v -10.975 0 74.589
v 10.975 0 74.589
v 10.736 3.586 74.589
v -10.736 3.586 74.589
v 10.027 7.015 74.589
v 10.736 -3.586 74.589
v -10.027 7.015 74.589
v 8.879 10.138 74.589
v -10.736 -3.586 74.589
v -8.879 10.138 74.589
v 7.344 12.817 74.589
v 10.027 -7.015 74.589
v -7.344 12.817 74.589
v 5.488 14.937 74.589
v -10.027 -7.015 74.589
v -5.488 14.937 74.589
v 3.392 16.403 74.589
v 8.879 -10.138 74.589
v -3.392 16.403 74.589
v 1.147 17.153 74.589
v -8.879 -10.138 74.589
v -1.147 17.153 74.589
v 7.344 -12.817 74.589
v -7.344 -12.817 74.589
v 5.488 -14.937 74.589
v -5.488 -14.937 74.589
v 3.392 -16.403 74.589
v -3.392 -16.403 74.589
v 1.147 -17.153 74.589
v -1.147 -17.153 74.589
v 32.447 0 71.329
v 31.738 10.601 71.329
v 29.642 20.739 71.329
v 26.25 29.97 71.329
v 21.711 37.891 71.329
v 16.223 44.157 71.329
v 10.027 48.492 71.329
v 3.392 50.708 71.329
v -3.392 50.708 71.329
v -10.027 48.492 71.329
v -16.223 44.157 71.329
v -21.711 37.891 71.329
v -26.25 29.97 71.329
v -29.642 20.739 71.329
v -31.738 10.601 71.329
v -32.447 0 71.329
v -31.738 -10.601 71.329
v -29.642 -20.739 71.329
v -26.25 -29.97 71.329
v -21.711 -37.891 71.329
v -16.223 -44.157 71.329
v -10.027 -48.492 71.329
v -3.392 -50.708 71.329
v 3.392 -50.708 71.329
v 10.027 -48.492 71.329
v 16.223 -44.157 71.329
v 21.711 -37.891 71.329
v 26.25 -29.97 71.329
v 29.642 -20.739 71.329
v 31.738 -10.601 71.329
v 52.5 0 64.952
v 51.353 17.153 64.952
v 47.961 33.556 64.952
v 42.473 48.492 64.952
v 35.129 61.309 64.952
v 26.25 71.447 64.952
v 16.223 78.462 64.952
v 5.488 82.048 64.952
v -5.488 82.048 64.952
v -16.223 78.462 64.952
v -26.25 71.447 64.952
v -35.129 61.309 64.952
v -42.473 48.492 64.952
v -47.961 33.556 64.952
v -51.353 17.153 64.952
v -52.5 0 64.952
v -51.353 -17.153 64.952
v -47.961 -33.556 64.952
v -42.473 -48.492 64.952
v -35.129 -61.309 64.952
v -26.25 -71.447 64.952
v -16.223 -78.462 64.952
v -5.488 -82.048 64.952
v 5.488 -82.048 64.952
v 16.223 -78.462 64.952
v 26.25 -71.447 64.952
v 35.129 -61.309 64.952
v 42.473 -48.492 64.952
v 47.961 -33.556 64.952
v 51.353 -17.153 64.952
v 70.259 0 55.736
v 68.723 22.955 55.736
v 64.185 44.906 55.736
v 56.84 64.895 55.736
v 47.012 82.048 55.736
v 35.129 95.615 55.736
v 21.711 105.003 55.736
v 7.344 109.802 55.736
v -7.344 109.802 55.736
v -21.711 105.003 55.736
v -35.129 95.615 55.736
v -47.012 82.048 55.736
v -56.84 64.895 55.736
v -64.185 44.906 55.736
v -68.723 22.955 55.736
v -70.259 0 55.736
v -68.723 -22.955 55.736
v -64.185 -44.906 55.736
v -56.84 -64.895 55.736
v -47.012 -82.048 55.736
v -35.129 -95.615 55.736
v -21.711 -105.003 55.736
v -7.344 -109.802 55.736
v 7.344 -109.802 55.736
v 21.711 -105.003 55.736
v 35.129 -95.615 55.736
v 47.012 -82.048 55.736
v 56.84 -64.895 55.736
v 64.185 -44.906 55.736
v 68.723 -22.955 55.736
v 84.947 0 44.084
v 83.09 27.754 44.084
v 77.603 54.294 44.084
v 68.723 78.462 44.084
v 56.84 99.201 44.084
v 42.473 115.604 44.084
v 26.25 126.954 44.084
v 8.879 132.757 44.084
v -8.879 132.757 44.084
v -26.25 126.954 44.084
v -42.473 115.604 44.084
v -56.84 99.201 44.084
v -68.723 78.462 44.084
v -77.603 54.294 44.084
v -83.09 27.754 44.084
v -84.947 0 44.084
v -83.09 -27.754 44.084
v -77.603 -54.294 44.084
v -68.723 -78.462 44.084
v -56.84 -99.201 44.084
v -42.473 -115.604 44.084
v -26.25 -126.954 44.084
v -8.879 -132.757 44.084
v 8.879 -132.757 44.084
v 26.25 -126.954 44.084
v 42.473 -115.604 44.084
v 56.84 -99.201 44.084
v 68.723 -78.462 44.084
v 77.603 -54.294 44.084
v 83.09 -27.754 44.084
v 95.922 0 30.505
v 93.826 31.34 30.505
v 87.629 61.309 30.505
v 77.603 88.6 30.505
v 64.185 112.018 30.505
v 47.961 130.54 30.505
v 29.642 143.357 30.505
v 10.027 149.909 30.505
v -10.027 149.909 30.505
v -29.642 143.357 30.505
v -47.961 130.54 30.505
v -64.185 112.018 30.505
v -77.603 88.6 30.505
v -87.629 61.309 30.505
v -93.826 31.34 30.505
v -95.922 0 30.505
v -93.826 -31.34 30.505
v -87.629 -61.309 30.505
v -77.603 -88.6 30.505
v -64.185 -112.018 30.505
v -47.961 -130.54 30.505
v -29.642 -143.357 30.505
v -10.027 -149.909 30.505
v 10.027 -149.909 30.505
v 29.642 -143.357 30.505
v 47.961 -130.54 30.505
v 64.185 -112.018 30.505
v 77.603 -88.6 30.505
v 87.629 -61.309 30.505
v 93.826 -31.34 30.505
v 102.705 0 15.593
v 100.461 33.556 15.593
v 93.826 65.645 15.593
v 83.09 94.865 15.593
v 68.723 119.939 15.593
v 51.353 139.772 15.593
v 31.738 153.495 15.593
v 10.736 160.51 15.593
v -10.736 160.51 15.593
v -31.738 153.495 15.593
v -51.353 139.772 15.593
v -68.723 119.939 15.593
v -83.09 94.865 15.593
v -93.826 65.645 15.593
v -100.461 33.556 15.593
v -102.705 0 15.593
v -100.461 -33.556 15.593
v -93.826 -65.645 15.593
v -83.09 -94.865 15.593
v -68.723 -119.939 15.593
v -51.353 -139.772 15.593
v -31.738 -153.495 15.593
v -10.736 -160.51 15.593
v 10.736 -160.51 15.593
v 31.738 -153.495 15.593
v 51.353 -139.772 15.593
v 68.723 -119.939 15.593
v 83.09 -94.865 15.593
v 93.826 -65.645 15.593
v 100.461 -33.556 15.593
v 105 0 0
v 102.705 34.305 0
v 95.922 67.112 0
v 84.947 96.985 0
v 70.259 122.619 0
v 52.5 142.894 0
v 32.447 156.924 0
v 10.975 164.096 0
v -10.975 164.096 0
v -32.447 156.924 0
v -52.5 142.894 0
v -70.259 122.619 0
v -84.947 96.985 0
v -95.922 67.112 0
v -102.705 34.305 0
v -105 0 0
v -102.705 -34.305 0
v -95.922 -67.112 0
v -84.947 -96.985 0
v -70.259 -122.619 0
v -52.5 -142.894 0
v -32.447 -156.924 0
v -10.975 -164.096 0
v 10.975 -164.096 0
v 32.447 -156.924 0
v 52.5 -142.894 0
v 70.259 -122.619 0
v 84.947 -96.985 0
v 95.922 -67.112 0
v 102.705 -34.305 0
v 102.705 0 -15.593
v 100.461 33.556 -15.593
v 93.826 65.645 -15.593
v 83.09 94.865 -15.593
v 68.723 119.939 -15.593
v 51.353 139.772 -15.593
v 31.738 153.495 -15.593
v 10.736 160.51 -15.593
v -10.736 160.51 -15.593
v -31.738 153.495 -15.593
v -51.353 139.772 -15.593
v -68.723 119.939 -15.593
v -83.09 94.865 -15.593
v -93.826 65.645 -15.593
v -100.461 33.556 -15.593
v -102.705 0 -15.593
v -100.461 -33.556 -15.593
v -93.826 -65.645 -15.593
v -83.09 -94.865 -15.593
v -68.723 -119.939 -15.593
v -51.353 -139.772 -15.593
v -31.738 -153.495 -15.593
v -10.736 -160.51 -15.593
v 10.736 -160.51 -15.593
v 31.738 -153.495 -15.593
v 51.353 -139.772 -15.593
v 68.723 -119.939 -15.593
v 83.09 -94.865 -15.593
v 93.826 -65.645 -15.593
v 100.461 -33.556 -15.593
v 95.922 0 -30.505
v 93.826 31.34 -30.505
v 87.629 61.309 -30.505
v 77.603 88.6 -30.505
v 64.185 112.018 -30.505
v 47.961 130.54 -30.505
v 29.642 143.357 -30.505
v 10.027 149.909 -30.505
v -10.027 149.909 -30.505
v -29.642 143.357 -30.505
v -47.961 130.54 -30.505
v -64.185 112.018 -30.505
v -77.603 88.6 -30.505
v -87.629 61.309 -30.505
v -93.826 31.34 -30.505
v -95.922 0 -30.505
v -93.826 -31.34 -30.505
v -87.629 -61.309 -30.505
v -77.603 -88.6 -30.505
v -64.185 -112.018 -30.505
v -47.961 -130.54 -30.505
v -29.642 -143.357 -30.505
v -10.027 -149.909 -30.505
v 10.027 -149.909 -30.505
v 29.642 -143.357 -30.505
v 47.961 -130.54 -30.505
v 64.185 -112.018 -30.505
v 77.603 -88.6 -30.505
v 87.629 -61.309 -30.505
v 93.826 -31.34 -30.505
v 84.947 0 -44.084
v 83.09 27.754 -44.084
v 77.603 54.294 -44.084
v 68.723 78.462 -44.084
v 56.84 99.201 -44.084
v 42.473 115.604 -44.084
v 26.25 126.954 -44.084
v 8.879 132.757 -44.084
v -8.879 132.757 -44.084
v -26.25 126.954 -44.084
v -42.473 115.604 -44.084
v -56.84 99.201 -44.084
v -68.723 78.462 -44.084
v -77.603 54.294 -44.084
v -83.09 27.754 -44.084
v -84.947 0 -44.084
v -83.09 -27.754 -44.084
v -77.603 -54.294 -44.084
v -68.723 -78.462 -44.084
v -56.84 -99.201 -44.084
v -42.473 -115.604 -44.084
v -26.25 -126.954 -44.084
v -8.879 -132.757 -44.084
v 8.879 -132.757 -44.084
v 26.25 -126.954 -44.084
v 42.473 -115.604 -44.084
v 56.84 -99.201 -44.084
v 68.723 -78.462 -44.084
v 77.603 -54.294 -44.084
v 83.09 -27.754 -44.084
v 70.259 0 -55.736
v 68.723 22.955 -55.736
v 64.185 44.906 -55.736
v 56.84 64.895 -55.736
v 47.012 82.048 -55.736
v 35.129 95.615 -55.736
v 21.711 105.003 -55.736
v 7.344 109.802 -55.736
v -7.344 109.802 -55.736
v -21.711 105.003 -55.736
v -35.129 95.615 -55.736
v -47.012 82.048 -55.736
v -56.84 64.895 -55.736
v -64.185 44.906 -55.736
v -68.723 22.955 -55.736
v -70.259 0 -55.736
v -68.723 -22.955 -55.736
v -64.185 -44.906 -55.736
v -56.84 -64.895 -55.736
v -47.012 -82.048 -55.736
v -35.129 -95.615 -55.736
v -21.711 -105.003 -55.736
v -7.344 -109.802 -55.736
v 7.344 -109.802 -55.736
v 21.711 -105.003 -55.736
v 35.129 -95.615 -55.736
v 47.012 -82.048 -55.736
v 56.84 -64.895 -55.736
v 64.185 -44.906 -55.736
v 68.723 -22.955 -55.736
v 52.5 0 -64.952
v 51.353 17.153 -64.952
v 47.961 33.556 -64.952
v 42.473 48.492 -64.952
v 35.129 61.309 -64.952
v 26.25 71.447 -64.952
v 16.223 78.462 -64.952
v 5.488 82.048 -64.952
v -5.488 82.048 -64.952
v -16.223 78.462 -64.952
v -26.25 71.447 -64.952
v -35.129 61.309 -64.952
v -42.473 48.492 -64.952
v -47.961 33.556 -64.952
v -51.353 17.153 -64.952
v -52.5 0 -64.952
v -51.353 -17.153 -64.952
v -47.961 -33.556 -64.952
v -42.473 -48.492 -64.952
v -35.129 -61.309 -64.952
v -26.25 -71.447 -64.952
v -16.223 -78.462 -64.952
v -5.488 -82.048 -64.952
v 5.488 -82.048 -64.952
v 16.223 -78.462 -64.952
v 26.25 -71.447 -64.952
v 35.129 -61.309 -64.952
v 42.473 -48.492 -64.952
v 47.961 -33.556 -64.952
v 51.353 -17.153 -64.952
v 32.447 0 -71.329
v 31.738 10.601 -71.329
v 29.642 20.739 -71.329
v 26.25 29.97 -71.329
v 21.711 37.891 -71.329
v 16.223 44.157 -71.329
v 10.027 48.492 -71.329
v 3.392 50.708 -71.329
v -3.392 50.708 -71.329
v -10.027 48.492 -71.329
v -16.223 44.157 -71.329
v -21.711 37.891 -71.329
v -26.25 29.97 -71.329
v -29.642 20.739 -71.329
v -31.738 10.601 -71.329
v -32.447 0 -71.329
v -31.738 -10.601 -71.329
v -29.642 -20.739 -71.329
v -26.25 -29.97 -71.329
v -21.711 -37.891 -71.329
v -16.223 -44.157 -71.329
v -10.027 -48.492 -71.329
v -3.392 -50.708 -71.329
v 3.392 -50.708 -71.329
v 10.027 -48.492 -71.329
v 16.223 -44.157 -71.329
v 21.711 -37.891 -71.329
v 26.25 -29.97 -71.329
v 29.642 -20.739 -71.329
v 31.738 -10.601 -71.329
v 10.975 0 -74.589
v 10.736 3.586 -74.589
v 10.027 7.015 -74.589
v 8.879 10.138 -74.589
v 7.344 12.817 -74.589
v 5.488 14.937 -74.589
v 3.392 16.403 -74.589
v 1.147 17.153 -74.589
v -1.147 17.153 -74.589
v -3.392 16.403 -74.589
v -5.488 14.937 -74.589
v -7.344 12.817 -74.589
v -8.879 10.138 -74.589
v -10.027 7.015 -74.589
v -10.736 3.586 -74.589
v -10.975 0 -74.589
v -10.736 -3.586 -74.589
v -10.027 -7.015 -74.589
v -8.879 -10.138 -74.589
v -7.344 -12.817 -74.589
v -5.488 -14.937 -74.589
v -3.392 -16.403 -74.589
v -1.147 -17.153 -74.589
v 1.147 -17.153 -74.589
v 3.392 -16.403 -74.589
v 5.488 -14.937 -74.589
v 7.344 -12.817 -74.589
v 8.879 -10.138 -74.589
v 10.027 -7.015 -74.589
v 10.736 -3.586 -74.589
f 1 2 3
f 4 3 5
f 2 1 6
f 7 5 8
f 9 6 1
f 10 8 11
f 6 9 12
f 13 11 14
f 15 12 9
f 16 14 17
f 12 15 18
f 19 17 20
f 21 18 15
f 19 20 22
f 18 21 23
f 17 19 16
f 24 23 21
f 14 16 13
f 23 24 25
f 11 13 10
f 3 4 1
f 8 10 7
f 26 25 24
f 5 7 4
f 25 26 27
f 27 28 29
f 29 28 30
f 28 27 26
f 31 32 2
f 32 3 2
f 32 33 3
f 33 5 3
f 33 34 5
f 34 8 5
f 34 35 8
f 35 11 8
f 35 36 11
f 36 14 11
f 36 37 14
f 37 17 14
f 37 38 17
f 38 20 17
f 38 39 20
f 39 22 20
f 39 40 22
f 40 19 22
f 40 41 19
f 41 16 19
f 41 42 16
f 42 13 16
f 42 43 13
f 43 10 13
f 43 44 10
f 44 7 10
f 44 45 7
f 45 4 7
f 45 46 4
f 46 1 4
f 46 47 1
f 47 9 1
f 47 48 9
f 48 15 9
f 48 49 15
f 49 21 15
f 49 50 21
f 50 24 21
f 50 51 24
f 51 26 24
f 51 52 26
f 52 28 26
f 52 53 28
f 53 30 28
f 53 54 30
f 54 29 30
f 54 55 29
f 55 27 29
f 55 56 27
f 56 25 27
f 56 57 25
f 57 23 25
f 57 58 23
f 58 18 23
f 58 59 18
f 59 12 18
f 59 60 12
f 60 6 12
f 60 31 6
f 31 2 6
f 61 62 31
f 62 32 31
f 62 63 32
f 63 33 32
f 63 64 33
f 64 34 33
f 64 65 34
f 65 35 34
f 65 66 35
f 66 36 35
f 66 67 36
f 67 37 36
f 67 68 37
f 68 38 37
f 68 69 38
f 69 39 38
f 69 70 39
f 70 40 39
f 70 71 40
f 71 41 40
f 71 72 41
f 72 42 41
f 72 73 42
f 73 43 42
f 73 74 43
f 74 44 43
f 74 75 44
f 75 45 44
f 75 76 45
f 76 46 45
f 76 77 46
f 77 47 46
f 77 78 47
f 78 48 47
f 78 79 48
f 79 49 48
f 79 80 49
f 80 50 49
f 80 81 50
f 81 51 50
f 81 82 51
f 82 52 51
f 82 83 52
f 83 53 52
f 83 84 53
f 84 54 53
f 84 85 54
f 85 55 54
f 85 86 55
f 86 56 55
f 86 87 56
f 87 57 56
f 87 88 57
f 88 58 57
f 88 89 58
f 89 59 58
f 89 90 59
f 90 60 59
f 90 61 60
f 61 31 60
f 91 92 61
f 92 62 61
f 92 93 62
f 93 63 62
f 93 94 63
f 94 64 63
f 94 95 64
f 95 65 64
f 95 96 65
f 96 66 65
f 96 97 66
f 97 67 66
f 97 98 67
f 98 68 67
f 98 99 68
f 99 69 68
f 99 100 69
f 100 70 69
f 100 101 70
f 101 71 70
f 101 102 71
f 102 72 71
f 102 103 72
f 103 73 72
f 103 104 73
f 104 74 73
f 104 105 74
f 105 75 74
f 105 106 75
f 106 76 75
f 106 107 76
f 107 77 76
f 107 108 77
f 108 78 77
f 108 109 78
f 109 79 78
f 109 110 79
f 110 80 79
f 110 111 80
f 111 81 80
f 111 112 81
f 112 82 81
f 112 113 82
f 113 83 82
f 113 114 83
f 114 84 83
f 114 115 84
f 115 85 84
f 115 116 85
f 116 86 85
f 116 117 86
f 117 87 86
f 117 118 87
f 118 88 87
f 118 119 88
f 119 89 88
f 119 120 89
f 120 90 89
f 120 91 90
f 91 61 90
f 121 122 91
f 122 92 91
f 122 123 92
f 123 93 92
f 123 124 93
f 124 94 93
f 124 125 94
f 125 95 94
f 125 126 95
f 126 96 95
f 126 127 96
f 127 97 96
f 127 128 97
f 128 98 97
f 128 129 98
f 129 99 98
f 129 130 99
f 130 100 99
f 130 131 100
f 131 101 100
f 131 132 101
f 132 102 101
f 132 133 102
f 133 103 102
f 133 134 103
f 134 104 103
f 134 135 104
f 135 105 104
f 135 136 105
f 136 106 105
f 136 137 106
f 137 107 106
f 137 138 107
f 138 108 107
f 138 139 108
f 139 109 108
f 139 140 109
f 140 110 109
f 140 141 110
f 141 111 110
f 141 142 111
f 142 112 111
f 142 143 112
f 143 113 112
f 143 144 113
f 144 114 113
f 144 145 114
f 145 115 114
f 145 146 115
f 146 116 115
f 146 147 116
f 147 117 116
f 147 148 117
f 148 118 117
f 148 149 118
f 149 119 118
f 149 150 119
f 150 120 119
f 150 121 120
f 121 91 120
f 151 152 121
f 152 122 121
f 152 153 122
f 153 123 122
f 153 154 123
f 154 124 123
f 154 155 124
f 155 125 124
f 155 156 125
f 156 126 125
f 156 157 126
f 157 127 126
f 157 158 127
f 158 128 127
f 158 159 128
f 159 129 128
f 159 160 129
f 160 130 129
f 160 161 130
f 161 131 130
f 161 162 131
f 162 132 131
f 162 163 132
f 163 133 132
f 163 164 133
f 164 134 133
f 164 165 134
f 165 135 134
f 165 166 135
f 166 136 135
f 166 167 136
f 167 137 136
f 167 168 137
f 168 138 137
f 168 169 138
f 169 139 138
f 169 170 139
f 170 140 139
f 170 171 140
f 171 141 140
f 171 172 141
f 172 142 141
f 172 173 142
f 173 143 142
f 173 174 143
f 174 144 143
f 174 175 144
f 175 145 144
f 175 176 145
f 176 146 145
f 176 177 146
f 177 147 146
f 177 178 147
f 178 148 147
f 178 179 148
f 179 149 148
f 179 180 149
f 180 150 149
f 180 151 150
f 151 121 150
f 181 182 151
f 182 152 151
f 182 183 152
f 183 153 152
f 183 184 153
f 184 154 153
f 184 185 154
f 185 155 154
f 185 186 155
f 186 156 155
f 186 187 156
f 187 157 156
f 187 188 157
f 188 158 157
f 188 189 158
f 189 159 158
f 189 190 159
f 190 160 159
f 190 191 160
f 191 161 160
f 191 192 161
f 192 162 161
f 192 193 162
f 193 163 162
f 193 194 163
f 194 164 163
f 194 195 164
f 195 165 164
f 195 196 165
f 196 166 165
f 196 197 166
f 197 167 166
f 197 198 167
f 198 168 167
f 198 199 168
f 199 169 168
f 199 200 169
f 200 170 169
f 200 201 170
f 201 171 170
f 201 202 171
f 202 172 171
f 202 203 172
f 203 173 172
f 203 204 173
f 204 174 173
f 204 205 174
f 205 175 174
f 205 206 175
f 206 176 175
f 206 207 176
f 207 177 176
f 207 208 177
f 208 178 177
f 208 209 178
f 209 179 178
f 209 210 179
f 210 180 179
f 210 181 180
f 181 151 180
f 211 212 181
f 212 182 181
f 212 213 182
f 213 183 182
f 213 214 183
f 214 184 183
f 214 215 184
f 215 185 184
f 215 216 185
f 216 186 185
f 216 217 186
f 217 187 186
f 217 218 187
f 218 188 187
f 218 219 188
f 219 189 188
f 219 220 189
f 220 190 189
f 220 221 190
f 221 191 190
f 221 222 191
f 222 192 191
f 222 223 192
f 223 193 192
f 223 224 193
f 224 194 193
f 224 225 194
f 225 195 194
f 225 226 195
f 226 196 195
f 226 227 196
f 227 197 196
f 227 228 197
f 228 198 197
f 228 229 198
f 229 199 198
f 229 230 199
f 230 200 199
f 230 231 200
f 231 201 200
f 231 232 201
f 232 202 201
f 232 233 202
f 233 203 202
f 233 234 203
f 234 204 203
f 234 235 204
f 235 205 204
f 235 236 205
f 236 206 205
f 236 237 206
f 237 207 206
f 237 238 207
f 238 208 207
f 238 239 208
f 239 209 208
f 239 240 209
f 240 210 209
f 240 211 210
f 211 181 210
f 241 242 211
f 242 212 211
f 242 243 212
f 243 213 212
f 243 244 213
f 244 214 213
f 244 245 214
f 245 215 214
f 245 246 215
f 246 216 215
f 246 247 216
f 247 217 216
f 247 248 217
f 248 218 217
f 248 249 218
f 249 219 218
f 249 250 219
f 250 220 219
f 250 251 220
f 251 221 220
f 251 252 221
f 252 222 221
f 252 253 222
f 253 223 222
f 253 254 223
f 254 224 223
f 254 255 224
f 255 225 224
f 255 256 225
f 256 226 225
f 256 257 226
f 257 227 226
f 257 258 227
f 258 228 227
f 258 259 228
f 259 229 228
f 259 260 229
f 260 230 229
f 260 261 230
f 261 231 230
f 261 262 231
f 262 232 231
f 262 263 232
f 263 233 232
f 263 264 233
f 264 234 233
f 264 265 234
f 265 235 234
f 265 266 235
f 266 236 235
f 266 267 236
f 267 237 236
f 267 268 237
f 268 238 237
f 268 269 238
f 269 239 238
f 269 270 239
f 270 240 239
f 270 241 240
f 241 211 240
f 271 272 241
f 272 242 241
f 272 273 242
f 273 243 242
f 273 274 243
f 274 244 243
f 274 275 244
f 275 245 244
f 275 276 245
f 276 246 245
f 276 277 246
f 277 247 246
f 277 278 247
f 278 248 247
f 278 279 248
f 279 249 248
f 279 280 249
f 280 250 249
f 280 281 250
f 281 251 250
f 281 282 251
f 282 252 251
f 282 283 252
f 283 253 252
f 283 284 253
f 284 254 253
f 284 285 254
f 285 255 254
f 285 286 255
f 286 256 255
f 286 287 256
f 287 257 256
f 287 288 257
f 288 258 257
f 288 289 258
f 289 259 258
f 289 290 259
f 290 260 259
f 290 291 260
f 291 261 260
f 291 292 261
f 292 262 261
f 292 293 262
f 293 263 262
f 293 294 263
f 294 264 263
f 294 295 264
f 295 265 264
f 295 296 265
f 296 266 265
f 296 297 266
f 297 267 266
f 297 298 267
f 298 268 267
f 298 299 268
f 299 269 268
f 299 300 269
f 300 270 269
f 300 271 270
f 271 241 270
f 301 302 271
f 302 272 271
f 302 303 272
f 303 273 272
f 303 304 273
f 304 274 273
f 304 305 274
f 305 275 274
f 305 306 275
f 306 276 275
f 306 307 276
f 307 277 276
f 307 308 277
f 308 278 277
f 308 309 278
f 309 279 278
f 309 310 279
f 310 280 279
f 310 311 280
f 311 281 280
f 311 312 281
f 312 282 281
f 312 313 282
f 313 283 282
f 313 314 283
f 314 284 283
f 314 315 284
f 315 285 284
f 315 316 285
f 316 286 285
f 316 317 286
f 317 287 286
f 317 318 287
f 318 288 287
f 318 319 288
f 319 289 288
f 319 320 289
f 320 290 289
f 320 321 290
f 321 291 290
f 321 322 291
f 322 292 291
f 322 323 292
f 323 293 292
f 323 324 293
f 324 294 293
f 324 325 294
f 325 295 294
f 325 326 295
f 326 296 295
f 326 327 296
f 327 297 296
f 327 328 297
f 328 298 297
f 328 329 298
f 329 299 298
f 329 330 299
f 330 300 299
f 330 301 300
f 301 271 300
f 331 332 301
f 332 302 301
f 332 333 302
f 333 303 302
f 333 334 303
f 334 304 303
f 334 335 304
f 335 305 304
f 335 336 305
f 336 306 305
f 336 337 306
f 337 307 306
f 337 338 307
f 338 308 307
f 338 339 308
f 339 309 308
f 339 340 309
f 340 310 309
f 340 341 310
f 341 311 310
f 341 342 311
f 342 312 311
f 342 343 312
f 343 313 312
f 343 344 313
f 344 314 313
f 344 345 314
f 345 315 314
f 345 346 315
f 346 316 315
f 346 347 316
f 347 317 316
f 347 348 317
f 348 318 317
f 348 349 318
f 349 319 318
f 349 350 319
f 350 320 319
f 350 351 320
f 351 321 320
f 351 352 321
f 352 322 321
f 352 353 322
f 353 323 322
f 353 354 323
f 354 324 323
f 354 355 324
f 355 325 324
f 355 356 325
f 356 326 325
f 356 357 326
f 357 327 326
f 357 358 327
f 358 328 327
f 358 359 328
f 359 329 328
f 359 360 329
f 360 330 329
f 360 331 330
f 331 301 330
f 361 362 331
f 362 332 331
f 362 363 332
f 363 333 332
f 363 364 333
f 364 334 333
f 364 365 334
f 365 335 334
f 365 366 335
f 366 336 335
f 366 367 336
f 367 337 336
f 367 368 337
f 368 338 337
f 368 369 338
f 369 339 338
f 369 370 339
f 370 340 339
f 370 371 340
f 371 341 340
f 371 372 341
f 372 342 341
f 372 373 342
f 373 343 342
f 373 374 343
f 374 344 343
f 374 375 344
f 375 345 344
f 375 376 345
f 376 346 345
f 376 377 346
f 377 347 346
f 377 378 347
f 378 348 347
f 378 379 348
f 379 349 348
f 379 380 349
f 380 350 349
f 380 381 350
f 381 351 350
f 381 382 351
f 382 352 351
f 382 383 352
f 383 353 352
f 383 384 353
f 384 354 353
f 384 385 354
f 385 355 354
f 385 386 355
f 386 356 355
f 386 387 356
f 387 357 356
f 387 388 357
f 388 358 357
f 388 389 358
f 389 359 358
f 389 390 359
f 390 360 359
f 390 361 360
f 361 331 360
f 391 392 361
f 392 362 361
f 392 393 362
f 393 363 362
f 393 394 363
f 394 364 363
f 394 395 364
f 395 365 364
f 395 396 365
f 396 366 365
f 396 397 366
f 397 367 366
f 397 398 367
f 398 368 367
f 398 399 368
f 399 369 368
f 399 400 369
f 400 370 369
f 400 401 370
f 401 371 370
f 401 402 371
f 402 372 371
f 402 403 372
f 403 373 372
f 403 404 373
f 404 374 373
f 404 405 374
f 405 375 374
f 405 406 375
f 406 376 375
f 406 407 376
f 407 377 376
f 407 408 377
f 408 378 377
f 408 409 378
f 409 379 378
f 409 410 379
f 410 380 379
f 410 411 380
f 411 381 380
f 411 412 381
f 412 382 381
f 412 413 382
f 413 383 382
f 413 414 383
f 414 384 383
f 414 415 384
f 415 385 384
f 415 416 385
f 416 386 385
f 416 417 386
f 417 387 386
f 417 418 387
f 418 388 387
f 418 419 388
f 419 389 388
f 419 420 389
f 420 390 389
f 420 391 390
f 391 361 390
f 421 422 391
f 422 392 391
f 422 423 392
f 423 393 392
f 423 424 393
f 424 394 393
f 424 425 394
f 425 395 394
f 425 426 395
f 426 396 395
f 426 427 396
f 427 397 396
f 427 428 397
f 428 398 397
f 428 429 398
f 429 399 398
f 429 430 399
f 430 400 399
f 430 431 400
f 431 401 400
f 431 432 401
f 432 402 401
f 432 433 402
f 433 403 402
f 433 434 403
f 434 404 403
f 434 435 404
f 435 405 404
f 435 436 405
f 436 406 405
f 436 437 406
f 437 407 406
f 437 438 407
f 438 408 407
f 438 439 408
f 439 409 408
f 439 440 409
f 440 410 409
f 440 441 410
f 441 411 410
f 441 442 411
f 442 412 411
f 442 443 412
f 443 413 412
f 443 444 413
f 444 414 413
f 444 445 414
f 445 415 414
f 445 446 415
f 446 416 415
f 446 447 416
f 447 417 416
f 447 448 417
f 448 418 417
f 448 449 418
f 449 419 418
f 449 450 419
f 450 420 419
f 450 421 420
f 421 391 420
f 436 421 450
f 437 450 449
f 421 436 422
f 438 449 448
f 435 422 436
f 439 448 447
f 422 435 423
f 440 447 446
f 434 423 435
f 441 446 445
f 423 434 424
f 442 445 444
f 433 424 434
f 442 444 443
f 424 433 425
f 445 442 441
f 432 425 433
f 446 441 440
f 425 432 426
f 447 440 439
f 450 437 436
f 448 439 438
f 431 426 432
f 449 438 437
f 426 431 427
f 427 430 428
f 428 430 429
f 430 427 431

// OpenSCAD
// Generated by SolidPython 1.0.1 on 2020-07-29 00:46:47


scale(v = [7, 11, 5]) {
	sphere(r = 15);
}
/***********************************************
*********      SolidPython code:      **********
************************************************
 
# import packages: SolidPython
from solid import *
from solid.utils import *
from itertools import chain, combinations, permutations


class Resize:

    def __init__(self, scad_file):
        self.scad_file = scad_file
        #self.scad_file = import_scad(scad_file)
        # cone/cylinder param:
        self.r1 = 0
        self.r2 = 0
        self.h = 0
        # rectangular prism param:
        self.w = 0
        self.l = 0
        # ellipse param:
        self.r = 0

    # import OpenScad code (file name corresponds to shape)


    # classify shape + parameters
    def assign(self, param1, param2, param3):
        if self.scad_file == 'cone.scad':
            self.r1 = param1
            self.r2 = param2
            self.h = param3
        elif self.scad_file == 'cylinder.scad':
            self.r1 = param1
            self.r2 = param2
            self.h = param3
        elif self.scad_file == 'rectangularPrism.scad':
            self.h = param1
            self.l = param2
            self.w = param3
        else:
            self.r = param1
            self.h = param2

    # resize parameters
    def iterate(self):
        x = range(3, 20, 2)
        i = 1
        if self.scad_file == 'cone.scad':
            tempList = list(permutations(x, 2))
            for temp in tempList:
                param1 = temp[0]
                param2 = temp[1]
                filepath = 'produced_scad_files/' + 'cone' + str(param1) + '_' + str(param2) + '_' + '.scad'
                scad_render_to_file(cylinder(h=param1, r1=param2, r2=0), filepath)

        elif self.scad_file == 'cylinder.scad':
            tempList = list(permutations(x, 3))
            for temp in tempList:
                param1 = temp[0]
                param2 = temp[1]
                filepath = 'produced_scad_files/' + 'cylinder' + str(param1) + '_' + str(param2) + '_' + '.scad'
                scad_render_to_file(cylinder(h=param1, r1=param2, r2=param2), filepath)

        elif self.scad_file == 'rectangularPrism.scad':
            tempList = list(permutations(x, 3))
            for temp in tempList:
                param1 = temp[0]
                param2 = temp[1]
                param3 = temp[2]
                filepath = 'produced_scad_files/' + 'rectangularPrism' + str(param1) + '_' + str(param2) + '_' + str(
                    param3) + '.scad'
                scad_render_to_file(cube(size=(param1, param2, param3)), filepath)

        elif self.scad_file == 'ellipse.scad':
            tempList = list(permutations(x, 4))
            for temp in tempList:
                param1 = temp[0]
                param2 = temp[1]
                param3 = temp[2]
                param4 = temp[3]
                filepath = 'produced_scad_files/' + 'ellipse' + str(param1) + '_' + str(param2) + '_' + str(param3) + '_' + str(param4) + '.scad'
                scad_render_to_file(scale([param1, param2, param3])(sphere(r=param4)), filepath)

    def render_to_scadfile(self):
        scad_render_to_file(scad, 'example.scad') 
 
************************************************/
